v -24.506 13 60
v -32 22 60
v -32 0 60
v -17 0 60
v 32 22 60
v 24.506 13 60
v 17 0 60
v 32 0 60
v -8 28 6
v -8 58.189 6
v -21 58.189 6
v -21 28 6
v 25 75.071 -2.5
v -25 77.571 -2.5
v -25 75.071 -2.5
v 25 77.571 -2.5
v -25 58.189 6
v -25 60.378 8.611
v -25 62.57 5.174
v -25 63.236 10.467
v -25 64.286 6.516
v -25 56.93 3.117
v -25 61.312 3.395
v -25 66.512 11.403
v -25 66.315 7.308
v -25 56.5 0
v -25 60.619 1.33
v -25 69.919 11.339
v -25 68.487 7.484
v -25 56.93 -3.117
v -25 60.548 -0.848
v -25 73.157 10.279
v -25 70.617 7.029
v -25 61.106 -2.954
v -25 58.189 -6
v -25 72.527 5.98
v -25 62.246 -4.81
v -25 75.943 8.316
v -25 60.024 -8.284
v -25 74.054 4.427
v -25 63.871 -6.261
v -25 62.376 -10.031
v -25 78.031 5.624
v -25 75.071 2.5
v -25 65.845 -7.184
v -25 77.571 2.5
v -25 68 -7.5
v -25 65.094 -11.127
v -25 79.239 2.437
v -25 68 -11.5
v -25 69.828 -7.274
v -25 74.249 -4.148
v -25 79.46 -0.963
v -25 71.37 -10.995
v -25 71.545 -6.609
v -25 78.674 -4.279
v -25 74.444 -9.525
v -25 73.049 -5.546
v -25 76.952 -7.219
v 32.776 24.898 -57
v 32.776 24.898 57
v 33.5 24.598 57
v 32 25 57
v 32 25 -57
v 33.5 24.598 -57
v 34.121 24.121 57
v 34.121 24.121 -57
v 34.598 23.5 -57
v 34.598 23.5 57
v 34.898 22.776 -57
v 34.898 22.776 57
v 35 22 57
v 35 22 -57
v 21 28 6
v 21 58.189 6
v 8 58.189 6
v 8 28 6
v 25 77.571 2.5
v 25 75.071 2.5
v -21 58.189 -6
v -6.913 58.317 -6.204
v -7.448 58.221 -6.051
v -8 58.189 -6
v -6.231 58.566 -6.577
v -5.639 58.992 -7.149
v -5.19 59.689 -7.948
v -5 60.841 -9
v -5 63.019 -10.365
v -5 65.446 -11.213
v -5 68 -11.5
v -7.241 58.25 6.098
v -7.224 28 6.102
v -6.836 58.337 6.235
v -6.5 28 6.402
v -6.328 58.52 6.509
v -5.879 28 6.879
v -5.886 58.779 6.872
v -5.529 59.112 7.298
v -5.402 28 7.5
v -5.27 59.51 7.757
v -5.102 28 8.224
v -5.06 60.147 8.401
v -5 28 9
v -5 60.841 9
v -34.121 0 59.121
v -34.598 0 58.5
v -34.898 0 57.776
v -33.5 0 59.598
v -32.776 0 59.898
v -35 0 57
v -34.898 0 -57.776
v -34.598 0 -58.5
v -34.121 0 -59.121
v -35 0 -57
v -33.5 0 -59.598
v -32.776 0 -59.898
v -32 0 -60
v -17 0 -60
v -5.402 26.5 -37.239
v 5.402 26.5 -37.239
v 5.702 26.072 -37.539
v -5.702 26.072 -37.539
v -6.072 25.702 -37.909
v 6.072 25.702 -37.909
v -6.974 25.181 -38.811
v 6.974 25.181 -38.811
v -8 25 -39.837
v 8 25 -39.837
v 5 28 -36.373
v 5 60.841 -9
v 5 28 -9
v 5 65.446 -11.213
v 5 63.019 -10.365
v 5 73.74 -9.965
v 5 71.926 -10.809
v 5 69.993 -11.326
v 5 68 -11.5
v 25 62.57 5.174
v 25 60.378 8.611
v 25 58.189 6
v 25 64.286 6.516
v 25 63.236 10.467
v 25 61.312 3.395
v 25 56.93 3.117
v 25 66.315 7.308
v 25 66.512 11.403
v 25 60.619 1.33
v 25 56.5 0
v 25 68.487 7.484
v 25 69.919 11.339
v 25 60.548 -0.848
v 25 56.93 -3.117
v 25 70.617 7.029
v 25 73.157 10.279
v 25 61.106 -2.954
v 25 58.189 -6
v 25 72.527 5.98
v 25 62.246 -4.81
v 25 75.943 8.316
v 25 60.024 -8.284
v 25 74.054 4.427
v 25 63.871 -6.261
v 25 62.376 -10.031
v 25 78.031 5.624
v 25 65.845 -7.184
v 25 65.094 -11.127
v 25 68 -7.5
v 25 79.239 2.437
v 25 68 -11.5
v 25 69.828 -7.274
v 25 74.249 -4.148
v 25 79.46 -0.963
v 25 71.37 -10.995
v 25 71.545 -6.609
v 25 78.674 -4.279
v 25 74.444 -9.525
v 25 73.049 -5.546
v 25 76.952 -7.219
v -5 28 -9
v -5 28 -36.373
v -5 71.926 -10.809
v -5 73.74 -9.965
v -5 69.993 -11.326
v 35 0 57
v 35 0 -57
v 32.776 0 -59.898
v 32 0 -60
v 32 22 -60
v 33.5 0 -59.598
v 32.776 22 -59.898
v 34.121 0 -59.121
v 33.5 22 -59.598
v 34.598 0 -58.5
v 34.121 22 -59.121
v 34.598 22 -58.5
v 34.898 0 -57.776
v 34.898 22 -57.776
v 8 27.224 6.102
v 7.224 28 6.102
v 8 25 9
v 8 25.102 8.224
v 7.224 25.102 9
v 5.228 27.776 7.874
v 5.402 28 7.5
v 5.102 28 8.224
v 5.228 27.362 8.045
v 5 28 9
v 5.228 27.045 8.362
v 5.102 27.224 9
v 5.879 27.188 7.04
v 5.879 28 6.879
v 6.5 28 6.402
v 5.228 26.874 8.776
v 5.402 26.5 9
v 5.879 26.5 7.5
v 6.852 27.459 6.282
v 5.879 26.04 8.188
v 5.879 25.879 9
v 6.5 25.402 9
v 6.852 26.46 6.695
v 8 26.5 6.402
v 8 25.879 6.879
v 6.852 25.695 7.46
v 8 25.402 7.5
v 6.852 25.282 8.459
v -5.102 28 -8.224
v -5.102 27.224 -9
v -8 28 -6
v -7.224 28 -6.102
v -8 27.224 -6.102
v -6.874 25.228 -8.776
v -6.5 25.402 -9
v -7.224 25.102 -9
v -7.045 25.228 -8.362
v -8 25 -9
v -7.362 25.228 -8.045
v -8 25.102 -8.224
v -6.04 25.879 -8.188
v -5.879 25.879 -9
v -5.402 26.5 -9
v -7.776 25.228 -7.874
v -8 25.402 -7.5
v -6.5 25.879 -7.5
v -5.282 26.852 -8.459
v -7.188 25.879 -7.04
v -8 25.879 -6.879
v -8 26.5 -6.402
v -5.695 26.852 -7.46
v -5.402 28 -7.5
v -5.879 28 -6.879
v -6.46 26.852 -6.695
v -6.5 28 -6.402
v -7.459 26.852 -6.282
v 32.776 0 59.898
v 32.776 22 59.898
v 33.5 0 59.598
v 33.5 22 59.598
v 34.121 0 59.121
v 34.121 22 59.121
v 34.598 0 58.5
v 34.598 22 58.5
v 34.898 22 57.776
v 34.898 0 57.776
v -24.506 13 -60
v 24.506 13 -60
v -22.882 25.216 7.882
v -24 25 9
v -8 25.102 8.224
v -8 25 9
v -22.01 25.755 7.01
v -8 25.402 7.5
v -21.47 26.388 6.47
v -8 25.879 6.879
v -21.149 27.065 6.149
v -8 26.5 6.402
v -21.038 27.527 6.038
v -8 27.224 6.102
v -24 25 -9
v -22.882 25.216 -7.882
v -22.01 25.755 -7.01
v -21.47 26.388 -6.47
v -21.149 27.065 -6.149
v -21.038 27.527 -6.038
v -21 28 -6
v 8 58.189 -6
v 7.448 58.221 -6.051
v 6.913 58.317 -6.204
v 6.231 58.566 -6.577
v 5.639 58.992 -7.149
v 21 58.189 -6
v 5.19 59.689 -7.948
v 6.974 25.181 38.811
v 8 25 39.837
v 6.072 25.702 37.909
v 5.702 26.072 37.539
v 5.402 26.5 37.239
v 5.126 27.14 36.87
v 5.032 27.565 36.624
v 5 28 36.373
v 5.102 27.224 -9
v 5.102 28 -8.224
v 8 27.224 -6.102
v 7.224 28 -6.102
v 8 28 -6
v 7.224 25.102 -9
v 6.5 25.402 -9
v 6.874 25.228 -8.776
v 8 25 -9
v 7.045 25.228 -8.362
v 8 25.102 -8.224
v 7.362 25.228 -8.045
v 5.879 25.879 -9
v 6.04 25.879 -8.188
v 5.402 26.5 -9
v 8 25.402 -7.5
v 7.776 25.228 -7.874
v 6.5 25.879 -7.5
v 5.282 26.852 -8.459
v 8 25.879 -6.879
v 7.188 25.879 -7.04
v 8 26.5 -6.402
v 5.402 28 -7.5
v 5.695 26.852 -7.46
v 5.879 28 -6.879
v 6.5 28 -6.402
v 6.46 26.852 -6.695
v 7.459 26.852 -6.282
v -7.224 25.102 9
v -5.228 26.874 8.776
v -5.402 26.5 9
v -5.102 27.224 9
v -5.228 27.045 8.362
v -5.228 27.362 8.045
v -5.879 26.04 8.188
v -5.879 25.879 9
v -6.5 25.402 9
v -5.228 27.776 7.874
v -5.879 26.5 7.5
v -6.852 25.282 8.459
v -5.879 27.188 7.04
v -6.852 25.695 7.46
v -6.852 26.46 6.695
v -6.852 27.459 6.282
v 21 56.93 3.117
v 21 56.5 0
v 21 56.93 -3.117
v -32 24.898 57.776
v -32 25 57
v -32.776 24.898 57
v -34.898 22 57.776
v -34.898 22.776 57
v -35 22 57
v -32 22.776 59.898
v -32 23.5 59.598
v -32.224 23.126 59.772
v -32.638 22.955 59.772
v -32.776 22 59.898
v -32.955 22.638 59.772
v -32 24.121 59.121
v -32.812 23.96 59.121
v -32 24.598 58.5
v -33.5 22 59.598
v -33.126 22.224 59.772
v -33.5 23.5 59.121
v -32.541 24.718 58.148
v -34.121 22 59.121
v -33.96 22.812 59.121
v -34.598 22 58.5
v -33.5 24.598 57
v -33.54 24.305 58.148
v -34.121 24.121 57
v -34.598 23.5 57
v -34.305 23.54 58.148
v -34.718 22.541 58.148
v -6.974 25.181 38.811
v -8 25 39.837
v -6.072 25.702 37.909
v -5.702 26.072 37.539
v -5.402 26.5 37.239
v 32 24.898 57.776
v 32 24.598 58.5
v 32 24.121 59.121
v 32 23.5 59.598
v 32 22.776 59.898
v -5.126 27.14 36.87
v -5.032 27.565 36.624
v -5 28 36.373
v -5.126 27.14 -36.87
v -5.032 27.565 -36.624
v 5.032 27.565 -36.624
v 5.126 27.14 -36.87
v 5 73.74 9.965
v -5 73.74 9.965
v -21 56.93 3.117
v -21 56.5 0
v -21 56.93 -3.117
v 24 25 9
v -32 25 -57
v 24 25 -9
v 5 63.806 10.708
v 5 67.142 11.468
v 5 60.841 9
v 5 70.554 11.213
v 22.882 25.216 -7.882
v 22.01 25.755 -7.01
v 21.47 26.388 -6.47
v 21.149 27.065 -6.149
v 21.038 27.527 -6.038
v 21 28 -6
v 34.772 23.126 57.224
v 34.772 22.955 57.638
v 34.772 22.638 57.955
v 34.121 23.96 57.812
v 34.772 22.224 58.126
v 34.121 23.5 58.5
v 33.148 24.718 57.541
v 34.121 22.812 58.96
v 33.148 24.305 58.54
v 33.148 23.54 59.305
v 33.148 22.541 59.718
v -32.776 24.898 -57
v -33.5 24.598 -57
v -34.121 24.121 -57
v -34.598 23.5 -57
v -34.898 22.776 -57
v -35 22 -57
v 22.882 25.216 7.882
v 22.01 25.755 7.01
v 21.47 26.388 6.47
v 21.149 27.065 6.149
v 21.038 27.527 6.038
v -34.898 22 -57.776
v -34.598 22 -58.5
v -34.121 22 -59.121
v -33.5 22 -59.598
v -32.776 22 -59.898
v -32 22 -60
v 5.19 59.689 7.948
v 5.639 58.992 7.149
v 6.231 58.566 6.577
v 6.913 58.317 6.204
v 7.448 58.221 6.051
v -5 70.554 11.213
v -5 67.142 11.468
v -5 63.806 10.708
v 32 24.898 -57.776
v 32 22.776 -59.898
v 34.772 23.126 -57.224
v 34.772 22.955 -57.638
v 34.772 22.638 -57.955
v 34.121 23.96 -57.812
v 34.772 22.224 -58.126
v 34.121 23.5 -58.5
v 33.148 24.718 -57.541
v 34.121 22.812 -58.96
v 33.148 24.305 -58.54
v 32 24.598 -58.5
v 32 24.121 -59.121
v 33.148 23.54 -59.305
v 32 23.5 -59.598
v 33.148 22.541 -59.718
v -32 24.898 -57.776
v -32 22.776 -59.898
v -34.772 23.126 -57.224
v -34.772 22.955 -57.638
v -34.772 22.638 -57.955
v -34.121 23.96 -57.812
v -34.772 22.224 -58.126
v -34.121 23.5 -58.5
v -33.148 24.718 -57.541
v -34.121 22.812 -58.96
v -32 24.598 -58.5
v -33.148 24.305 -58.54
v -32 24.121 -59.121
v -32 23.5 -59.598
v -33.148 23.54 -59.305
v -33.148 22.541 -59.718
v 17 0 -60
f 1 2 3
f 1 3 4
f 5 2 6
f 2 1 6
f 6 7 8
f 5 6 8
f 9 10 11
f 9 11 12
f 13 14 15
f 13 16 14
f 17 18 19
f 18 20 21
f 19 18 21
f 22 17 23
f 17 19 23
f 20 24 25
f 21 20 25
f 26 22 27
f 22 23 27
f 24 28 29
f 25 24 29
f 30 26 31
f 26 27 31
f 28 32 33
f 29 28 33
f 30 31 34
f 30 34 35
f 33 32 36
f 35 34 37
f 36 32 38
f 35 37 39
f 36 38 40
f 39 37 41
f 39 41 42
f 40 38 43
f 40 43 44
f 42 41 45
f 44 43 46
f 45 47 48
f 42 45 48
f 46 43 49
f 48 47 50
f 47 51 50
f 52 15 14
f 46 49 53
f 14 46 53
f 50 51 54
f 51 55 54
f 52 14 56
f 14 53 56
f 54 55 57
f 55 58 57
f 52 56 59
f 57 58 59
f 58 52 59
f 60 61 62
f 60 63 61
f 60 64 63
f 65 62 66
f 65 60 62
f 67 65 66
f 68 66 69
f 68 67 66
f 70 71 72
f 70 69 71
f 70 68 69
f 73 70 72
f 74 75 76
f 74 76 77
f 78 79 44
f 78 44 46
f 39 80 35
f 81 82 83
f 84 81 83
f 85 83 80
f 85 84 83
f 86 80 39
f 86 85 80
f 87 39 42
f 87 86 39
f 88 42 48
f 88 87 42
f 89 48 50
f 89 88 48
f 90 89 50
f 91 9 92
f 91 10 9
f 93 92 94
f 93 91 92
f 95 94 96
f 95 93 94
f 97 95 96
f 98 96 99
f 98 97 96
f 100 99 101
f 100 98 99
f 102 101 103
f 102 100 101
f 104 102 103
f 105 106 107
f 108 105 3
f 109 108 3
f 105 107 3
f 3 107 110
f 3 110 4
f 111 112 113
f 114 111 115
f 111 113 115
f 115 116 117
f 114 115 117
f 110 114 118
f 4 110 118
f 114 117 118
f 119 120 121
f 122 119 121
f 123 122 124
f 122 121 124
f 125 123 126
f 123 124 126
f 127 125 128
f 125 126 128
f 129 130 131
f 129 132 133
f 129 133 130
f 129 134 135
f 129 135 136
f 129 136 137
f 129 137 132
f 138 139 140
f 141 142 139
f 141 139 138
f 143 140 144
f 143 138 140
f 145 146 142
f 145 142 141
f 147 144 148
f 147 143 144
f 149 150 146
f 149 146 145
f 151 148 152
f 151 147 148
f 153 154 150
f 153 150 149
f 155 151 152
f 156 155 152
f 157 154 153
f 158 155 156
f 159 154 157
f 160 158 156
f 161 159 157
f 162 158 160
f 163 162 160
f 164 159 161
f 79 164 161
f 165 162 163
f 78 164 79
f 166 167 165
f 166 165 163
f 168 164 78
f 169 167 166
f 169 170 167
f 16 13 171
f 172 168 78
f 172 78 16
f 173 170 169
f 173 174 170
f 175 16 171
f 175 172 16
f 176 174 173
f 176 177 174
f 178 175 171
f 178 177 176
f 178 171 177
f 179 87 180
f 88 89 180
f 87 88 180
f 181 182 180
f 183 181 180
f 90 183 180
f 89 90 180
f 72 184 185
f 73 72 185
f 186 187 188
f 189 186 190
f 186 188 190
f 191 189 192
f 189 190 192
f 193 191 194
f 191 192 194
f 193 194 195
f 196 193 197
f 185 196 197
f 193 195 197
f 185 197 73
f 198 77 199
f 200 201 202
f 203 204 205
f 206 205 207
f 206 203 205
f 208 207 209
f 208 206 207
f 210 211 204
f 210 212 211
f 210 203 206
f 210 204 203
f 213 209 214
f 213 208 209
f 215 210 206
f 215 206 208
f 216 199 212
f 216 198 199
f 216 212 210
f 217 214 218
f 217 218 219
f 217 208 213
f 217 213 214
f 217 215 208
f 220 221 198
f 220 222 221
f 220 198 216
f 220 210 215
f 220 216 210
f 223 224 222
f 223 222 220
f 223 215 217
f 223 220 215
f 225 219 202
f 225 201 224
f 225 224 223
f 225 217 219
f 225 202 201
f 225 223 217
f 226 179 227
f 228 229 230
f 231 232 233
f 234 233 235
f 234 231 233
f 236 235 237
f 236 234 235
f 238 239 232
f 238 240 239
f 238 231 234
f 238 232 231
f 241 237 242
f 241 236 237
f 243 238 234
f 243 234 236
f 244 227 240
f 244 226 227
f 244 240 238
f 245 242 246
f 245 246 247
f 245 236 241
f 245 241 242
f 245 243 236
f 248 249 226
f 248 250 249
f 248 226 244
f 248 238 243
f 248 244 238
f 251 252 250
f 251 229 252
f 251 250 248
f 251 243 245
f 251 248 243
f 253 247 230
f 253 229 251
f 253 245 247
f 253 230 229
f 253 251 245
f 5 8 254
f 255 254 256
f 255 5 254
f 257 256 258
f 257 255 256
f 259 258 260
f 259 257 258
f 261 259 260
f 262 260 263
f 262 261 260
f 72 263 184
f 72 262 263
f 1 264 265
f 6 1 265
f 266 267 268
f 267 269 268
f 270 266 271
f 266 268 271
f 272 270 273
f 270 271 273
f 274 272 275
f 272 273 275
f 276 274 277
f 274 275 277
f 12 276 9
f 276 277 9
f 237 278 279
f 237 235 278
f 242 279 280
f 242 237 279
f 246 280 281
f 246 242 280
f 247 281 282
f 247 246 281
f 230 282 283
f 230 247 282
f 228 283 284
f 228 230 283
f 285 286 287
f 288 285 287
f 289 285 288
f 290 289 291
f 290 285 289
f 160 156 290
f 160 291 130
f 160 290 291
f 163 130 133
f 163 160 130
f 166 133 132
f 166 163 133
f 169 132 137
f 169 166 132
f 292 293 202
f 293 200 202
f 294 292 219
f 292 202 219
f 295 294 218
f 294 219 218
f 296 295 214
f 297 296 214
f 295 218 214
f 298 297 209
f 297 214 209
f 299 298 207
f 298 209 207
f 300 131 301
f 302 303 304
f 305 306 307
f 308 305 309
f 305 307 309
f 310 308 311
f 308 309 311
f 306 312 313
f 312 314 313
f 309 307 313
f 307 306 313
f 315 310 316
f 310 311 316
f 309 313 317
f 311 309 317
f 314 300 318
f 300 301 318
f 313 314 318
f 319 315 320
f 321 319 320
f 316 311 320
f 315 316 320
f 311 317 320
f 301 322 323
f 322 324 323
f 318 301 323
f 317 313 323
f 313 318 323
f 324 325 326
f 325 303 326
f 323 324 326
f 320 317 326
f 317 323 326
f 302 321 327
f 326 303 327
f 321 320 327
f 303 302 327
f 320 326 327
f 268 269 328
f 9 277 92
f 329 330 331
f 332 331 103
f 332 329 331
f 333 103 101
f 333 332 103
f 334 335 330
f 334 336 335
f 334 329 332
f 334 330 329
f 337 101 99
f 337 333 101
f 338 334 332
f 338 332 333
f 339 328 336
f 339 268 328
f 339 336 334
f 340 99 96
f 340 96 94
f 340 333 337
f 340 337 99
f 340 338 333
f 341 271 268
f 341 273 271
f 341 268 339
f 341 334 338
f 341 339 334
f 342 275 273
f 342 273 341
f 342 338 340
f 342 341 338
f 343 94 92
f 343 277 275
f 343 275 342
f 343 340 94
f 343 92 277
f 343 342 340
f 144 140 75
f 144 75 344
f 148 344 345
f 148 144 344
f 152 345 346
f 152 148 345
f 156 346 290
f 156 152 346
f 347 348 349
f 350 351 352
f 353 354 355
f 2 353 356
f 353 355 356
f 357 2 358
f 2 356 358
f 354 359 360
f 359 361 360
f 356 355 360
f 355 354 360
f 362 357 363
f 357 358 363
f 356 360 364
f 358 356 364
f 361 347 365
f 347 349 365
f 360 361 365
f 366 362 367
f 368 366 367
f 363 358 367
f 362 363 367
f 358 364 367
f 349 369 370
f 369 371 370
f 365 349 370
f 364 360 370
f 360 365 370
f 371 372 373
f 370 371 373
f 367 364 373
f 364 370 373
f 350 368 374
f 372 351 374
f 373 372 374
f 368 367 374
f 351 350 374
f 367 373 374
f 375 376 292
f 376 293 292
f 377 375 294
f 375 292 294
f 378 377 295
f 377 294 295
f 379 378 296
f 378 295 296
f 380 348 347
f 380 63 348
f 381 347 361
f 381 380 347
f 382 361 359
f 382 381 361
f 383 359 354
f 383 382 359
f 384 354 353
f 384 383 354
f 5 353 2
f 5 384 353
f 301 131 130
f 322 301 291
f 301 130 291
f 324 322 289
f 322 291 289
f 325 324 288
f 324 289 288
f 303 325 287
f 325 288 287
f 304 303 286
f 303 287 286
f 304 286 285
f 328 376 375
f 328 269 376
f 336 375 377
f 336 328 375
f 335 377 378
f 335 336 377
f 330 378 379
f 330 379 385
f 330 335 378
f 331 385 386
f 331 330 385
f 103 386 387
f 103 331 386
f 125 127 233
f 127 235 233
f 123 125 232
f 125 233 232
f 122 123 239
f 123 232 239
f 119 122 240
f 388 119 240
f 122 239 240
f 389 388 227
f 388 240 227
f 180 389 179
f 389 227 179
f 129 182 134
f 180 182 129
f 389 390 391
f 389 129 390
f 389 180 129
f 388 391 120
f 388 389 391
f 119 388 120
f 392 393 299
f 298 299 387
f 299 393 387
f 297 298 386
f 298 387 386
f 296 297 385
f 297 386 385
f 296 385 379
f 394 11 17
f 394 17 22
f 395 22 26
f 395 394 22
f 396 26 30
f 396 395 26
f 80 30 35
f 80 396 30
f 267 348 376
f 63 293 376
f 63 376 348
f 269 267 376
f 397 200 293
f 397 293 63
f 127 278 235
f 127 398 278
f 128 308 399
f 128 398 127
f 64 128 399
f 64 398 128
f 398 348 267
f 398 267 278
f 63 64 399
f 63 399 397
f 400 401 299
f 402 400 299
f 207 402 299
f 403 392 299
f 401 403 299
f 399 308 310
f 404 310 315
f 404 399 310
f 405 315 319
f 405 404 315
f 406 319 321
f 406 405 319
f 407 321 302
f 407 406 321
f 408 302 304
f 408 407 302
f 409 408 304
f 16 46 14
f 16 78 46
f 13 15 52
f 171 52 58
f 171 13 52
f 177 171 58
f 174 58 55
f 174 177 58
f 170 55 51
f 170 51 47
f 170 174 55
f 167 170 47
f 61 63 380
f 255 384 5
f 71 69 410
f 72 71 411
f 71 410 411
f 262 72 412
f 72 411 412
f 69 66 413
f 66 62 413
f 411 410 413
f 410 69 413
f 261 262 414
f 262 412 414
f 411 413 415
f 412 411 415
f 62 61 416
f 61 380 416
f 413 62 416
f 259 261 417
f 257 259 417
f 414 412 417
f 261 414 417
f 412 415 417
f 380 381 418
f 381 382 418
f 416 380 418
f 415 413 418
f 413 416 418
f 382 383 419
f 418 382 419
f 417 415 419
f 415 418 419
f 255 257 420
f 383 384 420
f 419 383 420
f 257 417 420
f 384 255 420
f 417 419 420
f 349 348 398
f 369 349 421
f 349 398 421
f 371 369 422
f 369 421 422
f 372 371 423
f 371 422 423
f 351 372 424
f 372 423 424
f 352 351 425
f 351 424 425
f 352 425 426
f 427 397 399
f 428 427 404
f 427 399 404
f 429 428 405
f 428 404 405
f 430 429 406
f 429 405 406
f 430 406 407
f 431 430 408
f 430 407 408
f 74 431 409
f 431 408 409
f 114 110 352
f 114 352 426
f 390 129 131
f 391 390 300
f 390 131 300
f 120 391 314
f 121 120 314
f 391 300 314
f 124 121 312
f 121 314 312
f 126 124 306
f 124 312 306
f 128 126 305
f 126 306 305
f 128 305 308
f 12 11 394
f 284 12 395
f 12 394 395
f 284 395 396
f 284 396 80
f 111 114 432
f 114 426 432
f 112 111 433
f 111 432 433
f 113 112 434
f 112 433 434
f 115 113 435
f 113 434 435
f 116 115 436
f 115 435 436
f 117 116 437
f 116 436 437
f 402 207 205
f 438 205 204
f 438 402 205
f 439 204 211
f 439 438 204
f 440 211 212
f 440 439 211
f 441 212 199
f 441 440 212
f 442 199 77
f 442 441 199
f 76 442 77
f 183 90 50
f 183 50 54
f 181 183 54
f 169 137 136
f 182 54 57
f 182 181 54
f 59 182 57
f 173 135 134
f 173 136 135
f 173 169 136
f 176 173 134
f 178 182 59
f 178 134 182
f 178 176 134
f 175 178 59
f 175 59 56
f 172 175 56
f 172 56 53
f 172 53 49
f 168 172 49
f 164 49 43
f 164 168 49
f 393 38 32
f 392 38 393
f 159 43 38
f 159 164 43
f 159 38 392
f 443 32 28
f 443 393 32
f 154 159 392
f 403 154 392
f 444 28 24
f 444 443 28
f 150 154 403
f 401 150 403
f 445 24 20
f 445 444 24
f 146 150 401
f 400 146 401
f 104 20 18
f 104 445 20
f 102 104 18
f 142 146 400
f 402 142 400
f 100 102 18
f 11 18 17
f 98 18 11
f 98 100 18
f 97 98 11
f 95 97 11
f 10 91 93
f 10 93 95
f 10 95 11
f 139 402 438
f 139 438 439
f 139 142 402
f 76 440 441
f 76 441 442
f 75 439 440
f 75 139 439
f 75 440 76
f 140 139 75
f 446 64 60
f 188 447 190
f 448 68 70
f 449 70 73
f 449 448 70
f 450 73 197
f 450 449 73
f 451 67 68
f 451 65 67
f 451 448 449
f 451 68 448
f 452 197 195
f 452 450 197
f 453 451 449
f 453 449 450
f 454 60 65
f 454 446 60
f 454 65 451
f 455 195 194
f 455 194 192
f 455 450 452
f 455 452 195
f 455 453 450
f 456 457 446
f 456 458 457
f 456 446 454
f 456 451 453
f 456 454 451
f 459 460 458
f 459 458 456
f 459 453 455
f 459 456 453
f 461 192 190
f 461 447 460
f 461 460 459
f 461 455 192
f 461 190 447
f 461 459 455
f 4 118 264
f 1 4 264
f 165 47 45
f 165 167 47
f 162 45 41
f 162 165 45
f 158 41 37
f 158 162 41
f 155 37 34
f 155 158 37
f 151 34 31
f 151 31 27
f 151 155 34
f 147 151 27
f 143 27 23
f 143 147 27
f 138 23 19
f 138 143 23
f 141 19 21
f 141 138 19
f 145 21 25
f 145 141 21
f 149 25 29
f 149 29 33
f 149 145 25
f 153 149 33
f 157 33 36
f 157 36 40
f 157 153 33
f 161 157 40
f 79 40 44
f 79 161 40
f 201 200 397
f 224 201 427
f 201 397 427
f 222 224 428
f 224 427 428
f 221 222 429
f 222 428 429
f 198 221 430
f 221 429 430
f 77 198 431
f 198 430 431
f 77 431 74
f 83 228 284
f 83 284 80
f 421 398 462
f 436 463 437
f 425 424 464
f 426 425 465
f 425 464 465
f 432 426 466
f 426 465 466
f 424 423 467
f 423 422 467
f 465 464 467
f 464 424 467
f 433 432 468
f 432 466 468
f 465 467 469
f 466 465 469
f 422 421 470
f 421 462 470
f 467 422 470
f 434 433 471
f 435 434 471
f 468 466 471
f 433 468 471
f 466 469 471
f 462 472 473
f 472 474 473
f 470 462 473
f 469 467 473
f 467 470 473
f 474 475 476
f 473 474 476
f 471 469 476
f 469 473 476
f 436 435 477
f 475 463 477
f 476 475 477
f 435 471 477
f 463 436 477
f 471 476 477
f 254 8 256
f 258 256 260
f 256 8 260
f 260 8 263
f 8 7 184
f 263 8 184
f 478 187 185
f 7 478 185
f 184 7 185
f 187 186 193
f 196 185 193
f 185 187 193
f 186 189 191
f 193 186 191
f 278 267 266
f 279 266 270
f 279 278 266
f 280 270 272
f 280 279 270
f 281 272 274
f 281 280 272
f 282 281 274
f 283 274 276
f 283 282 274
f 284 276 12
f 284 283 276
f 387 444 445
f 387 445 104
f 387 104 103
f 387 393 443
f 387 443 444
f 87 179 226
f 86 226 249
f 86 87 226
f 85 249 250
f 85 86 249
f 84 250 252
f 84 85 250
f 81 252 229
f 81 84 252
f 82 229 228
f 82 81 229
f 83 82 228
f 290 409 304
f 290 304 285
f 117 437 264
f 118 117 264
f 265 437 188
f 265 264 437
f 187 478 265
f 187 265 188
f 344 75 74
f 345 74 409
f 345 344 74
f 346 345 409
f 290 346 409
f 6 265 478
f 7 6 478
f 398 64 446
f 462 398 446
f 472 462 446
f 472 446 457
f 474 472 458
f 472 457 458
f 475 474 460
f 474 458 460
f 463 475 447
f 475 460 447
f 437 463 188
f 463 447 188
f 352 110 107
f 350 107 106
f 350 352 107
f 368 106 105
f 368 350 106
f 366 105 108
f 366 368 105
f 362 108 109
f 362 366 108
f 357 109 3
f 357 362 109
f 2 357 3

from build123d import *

# Parameters (mm, degrees)
SKETCH1_W               = 70
SKETCH1_H               = 120
BOSS_EXTRUDE1_DEPTH     = 25
CUT_EXTRUDE1_DEPTH      = 61
CUT_EXTRUDE1_DEPTH_BACK = 61
BOSS_EXTRUDE6_DEPTH     = 25
BOSS_EXTRUDE7_DEPTH     = 21
RIB33_REACH             = 37
SKETCH10_WALL_W         = 128.291652
SKETCH10_WALL_H         = 10
FILLET1_R               = 3


with BuildPart() as part:
    # Sketch1 → Boss-Extrude1 (new body)
    with BuildSketch(Plane(origin=(0, 0, 0), x_dir=(1, 0, 0), z_dir=(0, 1, 0))):
        Rectangle(SKETCH1_W, SKETCH1_H)
    extrude(amount=BOSS_EXTRUDE1_DEPTH)

    # Sketch2 → Cut-Extrude1 (cut, two sides)
    with BuildSketch(Plane.XY) as cut_extrude1_sk:
        Polygon((-17, 0), (-24.505553, 13), (24.505553, 13), (17, 0), align=None)
    extrude(amount=CUT_EXTRUDE1_DEPTH, mode=Mode.SUBTRACT)
    extrude(cut_extrude1_sk.sketch, amount=-CUT_EXTRUDE1_DEPTH_BACK, mode=Mode.SUBTRACT)


with BuildPart() as body_2:
    # Sketch6 → Boss-Extrude6 (new, symmetric)
    with BuildSketch(Plane(origin=(0, 0, 0), x_dir=(0, 0, -1), z_dir=(1, 0, 0))):
        with BuildLine():
            ThreePointArc((11.5, 68), (-5.623611, 78.031201), (-6, 58.189292))
            ThreePointArc((-6, 58.189292), (0, 56.5), (6, 58.189292))
            ThreePointArc((6, 58.189292), (10.031201, 62.376389), (11.5, 68))
        make_face()
        with BuildLine():
            Line((-2.5, 75.071068), (-2.5, 77.571068))
            Line((-2.5, 77.571068), (2.5, 77.571068))
            Line((2.5, 77.571068), (2.5, 75.071068))
            ThreePointArc((2.5, 75.071068), (6.123724, 72.330127), (7.5, 68))
            ThreePointArc((7.5, 68), (-4.330127, 61.876276), (-2.5, 75.071068))
        make_face(mode=Mode.SUBTRACT)
    extrude(amount=BOSS_EXTRUDE6_DEPTH, both=True)


with BuildPart() as body_3:
    # Sketch6_3 → Boss-Extrude7 (new body)
    with BuildSketch(Plane(origin=(0, 0, 0), x_dir=(0, 0, -1), z_dir=(1, 0, 0))):
        with BuildLine():
            Line((-6, 58.189292), (-6, 25))
            Line((-6, 25), (6, 25))
            Line((6, 25), (6, 58.189292))
            ThreePointArc((6, 58.189292), (0, 56.5), (-6, 58.189292))
        make_face()
    extrude(amount=BOSS_EXTRUDE7_DEPTH)

    # Mirror4: body 3 across plane


with BuildPart() as body_3_1:
    add(body_3.part)
    add(body_3.part.mirror(Plane(origin=(0, 0, 0), x_dir=(0, 0, 1), z_dir=(1, 0, 0))))


with BuildPart() as body_2_1:
    add(body_2.part)

    # Combine2: union body 3, part
    add(body_3_1.part)
    add(part.part)

    # Sketch10 wall → Rib33 (add, up to next)
    with BuildSketch(Plane(origin=(0, 49.375, 24.032205), x_dir=(0, -0.866025, 0.5), z_dir=(0, -0.5, -0.866025)), mode=Mode.PRIVATE) as rib33_sk1:
        Rectangle(SKETCH10_WALL_W, SKETCH10_WALL_H)
    rib33_tool1 = extrude(rib33_sk1.sketch, amount=RIB33_REACH, mode=Mode.PRIVATE) - body_2_1.part
    rib33 = rib33_tool1.solids().sort_by_distance((0, 49.375, 24.032205))[0]
    add(rib33)

    # Mirror5: Rib33 across plane
    add(rib33.mirror(Plane.XY))

    # Fillet1
    fillet1_edges = [body_2_1.edges().sort_by_distance(p)[0] for p in [
        (5, 41.594646, -6),
        (5, 25, -22.052559),
        (-5, 41.594646, -6),
        (-5, 25, -22.052559),
        (0, 25, -38.105118),
        (13, 25, -6),
        (-21, 25, 0),
        (0, 25, -60),
        (-35, 25, 0),
        (21, 25, 0),
        (13, 25, 6),
        (0, 25, 60),
        (-35, 12.5, 60),
        (35, 25, 0),
        (35, 12.5, 60),
        (35, 12.5, -60),
        (-35, 12.5, -60),
        (-13, 25, 6),
        (5, 41.594646, 6),
        (5, 25, 22.052559),
        (-5, 25, 22.052559),
        (-5, 41.594646, 6),
        (0, 25, 38.105118),
        (-13, 25, -6),
    ]]
    fillet(fillet1_edges, radius=FILLET1_R)


solid = body_2_1.part
